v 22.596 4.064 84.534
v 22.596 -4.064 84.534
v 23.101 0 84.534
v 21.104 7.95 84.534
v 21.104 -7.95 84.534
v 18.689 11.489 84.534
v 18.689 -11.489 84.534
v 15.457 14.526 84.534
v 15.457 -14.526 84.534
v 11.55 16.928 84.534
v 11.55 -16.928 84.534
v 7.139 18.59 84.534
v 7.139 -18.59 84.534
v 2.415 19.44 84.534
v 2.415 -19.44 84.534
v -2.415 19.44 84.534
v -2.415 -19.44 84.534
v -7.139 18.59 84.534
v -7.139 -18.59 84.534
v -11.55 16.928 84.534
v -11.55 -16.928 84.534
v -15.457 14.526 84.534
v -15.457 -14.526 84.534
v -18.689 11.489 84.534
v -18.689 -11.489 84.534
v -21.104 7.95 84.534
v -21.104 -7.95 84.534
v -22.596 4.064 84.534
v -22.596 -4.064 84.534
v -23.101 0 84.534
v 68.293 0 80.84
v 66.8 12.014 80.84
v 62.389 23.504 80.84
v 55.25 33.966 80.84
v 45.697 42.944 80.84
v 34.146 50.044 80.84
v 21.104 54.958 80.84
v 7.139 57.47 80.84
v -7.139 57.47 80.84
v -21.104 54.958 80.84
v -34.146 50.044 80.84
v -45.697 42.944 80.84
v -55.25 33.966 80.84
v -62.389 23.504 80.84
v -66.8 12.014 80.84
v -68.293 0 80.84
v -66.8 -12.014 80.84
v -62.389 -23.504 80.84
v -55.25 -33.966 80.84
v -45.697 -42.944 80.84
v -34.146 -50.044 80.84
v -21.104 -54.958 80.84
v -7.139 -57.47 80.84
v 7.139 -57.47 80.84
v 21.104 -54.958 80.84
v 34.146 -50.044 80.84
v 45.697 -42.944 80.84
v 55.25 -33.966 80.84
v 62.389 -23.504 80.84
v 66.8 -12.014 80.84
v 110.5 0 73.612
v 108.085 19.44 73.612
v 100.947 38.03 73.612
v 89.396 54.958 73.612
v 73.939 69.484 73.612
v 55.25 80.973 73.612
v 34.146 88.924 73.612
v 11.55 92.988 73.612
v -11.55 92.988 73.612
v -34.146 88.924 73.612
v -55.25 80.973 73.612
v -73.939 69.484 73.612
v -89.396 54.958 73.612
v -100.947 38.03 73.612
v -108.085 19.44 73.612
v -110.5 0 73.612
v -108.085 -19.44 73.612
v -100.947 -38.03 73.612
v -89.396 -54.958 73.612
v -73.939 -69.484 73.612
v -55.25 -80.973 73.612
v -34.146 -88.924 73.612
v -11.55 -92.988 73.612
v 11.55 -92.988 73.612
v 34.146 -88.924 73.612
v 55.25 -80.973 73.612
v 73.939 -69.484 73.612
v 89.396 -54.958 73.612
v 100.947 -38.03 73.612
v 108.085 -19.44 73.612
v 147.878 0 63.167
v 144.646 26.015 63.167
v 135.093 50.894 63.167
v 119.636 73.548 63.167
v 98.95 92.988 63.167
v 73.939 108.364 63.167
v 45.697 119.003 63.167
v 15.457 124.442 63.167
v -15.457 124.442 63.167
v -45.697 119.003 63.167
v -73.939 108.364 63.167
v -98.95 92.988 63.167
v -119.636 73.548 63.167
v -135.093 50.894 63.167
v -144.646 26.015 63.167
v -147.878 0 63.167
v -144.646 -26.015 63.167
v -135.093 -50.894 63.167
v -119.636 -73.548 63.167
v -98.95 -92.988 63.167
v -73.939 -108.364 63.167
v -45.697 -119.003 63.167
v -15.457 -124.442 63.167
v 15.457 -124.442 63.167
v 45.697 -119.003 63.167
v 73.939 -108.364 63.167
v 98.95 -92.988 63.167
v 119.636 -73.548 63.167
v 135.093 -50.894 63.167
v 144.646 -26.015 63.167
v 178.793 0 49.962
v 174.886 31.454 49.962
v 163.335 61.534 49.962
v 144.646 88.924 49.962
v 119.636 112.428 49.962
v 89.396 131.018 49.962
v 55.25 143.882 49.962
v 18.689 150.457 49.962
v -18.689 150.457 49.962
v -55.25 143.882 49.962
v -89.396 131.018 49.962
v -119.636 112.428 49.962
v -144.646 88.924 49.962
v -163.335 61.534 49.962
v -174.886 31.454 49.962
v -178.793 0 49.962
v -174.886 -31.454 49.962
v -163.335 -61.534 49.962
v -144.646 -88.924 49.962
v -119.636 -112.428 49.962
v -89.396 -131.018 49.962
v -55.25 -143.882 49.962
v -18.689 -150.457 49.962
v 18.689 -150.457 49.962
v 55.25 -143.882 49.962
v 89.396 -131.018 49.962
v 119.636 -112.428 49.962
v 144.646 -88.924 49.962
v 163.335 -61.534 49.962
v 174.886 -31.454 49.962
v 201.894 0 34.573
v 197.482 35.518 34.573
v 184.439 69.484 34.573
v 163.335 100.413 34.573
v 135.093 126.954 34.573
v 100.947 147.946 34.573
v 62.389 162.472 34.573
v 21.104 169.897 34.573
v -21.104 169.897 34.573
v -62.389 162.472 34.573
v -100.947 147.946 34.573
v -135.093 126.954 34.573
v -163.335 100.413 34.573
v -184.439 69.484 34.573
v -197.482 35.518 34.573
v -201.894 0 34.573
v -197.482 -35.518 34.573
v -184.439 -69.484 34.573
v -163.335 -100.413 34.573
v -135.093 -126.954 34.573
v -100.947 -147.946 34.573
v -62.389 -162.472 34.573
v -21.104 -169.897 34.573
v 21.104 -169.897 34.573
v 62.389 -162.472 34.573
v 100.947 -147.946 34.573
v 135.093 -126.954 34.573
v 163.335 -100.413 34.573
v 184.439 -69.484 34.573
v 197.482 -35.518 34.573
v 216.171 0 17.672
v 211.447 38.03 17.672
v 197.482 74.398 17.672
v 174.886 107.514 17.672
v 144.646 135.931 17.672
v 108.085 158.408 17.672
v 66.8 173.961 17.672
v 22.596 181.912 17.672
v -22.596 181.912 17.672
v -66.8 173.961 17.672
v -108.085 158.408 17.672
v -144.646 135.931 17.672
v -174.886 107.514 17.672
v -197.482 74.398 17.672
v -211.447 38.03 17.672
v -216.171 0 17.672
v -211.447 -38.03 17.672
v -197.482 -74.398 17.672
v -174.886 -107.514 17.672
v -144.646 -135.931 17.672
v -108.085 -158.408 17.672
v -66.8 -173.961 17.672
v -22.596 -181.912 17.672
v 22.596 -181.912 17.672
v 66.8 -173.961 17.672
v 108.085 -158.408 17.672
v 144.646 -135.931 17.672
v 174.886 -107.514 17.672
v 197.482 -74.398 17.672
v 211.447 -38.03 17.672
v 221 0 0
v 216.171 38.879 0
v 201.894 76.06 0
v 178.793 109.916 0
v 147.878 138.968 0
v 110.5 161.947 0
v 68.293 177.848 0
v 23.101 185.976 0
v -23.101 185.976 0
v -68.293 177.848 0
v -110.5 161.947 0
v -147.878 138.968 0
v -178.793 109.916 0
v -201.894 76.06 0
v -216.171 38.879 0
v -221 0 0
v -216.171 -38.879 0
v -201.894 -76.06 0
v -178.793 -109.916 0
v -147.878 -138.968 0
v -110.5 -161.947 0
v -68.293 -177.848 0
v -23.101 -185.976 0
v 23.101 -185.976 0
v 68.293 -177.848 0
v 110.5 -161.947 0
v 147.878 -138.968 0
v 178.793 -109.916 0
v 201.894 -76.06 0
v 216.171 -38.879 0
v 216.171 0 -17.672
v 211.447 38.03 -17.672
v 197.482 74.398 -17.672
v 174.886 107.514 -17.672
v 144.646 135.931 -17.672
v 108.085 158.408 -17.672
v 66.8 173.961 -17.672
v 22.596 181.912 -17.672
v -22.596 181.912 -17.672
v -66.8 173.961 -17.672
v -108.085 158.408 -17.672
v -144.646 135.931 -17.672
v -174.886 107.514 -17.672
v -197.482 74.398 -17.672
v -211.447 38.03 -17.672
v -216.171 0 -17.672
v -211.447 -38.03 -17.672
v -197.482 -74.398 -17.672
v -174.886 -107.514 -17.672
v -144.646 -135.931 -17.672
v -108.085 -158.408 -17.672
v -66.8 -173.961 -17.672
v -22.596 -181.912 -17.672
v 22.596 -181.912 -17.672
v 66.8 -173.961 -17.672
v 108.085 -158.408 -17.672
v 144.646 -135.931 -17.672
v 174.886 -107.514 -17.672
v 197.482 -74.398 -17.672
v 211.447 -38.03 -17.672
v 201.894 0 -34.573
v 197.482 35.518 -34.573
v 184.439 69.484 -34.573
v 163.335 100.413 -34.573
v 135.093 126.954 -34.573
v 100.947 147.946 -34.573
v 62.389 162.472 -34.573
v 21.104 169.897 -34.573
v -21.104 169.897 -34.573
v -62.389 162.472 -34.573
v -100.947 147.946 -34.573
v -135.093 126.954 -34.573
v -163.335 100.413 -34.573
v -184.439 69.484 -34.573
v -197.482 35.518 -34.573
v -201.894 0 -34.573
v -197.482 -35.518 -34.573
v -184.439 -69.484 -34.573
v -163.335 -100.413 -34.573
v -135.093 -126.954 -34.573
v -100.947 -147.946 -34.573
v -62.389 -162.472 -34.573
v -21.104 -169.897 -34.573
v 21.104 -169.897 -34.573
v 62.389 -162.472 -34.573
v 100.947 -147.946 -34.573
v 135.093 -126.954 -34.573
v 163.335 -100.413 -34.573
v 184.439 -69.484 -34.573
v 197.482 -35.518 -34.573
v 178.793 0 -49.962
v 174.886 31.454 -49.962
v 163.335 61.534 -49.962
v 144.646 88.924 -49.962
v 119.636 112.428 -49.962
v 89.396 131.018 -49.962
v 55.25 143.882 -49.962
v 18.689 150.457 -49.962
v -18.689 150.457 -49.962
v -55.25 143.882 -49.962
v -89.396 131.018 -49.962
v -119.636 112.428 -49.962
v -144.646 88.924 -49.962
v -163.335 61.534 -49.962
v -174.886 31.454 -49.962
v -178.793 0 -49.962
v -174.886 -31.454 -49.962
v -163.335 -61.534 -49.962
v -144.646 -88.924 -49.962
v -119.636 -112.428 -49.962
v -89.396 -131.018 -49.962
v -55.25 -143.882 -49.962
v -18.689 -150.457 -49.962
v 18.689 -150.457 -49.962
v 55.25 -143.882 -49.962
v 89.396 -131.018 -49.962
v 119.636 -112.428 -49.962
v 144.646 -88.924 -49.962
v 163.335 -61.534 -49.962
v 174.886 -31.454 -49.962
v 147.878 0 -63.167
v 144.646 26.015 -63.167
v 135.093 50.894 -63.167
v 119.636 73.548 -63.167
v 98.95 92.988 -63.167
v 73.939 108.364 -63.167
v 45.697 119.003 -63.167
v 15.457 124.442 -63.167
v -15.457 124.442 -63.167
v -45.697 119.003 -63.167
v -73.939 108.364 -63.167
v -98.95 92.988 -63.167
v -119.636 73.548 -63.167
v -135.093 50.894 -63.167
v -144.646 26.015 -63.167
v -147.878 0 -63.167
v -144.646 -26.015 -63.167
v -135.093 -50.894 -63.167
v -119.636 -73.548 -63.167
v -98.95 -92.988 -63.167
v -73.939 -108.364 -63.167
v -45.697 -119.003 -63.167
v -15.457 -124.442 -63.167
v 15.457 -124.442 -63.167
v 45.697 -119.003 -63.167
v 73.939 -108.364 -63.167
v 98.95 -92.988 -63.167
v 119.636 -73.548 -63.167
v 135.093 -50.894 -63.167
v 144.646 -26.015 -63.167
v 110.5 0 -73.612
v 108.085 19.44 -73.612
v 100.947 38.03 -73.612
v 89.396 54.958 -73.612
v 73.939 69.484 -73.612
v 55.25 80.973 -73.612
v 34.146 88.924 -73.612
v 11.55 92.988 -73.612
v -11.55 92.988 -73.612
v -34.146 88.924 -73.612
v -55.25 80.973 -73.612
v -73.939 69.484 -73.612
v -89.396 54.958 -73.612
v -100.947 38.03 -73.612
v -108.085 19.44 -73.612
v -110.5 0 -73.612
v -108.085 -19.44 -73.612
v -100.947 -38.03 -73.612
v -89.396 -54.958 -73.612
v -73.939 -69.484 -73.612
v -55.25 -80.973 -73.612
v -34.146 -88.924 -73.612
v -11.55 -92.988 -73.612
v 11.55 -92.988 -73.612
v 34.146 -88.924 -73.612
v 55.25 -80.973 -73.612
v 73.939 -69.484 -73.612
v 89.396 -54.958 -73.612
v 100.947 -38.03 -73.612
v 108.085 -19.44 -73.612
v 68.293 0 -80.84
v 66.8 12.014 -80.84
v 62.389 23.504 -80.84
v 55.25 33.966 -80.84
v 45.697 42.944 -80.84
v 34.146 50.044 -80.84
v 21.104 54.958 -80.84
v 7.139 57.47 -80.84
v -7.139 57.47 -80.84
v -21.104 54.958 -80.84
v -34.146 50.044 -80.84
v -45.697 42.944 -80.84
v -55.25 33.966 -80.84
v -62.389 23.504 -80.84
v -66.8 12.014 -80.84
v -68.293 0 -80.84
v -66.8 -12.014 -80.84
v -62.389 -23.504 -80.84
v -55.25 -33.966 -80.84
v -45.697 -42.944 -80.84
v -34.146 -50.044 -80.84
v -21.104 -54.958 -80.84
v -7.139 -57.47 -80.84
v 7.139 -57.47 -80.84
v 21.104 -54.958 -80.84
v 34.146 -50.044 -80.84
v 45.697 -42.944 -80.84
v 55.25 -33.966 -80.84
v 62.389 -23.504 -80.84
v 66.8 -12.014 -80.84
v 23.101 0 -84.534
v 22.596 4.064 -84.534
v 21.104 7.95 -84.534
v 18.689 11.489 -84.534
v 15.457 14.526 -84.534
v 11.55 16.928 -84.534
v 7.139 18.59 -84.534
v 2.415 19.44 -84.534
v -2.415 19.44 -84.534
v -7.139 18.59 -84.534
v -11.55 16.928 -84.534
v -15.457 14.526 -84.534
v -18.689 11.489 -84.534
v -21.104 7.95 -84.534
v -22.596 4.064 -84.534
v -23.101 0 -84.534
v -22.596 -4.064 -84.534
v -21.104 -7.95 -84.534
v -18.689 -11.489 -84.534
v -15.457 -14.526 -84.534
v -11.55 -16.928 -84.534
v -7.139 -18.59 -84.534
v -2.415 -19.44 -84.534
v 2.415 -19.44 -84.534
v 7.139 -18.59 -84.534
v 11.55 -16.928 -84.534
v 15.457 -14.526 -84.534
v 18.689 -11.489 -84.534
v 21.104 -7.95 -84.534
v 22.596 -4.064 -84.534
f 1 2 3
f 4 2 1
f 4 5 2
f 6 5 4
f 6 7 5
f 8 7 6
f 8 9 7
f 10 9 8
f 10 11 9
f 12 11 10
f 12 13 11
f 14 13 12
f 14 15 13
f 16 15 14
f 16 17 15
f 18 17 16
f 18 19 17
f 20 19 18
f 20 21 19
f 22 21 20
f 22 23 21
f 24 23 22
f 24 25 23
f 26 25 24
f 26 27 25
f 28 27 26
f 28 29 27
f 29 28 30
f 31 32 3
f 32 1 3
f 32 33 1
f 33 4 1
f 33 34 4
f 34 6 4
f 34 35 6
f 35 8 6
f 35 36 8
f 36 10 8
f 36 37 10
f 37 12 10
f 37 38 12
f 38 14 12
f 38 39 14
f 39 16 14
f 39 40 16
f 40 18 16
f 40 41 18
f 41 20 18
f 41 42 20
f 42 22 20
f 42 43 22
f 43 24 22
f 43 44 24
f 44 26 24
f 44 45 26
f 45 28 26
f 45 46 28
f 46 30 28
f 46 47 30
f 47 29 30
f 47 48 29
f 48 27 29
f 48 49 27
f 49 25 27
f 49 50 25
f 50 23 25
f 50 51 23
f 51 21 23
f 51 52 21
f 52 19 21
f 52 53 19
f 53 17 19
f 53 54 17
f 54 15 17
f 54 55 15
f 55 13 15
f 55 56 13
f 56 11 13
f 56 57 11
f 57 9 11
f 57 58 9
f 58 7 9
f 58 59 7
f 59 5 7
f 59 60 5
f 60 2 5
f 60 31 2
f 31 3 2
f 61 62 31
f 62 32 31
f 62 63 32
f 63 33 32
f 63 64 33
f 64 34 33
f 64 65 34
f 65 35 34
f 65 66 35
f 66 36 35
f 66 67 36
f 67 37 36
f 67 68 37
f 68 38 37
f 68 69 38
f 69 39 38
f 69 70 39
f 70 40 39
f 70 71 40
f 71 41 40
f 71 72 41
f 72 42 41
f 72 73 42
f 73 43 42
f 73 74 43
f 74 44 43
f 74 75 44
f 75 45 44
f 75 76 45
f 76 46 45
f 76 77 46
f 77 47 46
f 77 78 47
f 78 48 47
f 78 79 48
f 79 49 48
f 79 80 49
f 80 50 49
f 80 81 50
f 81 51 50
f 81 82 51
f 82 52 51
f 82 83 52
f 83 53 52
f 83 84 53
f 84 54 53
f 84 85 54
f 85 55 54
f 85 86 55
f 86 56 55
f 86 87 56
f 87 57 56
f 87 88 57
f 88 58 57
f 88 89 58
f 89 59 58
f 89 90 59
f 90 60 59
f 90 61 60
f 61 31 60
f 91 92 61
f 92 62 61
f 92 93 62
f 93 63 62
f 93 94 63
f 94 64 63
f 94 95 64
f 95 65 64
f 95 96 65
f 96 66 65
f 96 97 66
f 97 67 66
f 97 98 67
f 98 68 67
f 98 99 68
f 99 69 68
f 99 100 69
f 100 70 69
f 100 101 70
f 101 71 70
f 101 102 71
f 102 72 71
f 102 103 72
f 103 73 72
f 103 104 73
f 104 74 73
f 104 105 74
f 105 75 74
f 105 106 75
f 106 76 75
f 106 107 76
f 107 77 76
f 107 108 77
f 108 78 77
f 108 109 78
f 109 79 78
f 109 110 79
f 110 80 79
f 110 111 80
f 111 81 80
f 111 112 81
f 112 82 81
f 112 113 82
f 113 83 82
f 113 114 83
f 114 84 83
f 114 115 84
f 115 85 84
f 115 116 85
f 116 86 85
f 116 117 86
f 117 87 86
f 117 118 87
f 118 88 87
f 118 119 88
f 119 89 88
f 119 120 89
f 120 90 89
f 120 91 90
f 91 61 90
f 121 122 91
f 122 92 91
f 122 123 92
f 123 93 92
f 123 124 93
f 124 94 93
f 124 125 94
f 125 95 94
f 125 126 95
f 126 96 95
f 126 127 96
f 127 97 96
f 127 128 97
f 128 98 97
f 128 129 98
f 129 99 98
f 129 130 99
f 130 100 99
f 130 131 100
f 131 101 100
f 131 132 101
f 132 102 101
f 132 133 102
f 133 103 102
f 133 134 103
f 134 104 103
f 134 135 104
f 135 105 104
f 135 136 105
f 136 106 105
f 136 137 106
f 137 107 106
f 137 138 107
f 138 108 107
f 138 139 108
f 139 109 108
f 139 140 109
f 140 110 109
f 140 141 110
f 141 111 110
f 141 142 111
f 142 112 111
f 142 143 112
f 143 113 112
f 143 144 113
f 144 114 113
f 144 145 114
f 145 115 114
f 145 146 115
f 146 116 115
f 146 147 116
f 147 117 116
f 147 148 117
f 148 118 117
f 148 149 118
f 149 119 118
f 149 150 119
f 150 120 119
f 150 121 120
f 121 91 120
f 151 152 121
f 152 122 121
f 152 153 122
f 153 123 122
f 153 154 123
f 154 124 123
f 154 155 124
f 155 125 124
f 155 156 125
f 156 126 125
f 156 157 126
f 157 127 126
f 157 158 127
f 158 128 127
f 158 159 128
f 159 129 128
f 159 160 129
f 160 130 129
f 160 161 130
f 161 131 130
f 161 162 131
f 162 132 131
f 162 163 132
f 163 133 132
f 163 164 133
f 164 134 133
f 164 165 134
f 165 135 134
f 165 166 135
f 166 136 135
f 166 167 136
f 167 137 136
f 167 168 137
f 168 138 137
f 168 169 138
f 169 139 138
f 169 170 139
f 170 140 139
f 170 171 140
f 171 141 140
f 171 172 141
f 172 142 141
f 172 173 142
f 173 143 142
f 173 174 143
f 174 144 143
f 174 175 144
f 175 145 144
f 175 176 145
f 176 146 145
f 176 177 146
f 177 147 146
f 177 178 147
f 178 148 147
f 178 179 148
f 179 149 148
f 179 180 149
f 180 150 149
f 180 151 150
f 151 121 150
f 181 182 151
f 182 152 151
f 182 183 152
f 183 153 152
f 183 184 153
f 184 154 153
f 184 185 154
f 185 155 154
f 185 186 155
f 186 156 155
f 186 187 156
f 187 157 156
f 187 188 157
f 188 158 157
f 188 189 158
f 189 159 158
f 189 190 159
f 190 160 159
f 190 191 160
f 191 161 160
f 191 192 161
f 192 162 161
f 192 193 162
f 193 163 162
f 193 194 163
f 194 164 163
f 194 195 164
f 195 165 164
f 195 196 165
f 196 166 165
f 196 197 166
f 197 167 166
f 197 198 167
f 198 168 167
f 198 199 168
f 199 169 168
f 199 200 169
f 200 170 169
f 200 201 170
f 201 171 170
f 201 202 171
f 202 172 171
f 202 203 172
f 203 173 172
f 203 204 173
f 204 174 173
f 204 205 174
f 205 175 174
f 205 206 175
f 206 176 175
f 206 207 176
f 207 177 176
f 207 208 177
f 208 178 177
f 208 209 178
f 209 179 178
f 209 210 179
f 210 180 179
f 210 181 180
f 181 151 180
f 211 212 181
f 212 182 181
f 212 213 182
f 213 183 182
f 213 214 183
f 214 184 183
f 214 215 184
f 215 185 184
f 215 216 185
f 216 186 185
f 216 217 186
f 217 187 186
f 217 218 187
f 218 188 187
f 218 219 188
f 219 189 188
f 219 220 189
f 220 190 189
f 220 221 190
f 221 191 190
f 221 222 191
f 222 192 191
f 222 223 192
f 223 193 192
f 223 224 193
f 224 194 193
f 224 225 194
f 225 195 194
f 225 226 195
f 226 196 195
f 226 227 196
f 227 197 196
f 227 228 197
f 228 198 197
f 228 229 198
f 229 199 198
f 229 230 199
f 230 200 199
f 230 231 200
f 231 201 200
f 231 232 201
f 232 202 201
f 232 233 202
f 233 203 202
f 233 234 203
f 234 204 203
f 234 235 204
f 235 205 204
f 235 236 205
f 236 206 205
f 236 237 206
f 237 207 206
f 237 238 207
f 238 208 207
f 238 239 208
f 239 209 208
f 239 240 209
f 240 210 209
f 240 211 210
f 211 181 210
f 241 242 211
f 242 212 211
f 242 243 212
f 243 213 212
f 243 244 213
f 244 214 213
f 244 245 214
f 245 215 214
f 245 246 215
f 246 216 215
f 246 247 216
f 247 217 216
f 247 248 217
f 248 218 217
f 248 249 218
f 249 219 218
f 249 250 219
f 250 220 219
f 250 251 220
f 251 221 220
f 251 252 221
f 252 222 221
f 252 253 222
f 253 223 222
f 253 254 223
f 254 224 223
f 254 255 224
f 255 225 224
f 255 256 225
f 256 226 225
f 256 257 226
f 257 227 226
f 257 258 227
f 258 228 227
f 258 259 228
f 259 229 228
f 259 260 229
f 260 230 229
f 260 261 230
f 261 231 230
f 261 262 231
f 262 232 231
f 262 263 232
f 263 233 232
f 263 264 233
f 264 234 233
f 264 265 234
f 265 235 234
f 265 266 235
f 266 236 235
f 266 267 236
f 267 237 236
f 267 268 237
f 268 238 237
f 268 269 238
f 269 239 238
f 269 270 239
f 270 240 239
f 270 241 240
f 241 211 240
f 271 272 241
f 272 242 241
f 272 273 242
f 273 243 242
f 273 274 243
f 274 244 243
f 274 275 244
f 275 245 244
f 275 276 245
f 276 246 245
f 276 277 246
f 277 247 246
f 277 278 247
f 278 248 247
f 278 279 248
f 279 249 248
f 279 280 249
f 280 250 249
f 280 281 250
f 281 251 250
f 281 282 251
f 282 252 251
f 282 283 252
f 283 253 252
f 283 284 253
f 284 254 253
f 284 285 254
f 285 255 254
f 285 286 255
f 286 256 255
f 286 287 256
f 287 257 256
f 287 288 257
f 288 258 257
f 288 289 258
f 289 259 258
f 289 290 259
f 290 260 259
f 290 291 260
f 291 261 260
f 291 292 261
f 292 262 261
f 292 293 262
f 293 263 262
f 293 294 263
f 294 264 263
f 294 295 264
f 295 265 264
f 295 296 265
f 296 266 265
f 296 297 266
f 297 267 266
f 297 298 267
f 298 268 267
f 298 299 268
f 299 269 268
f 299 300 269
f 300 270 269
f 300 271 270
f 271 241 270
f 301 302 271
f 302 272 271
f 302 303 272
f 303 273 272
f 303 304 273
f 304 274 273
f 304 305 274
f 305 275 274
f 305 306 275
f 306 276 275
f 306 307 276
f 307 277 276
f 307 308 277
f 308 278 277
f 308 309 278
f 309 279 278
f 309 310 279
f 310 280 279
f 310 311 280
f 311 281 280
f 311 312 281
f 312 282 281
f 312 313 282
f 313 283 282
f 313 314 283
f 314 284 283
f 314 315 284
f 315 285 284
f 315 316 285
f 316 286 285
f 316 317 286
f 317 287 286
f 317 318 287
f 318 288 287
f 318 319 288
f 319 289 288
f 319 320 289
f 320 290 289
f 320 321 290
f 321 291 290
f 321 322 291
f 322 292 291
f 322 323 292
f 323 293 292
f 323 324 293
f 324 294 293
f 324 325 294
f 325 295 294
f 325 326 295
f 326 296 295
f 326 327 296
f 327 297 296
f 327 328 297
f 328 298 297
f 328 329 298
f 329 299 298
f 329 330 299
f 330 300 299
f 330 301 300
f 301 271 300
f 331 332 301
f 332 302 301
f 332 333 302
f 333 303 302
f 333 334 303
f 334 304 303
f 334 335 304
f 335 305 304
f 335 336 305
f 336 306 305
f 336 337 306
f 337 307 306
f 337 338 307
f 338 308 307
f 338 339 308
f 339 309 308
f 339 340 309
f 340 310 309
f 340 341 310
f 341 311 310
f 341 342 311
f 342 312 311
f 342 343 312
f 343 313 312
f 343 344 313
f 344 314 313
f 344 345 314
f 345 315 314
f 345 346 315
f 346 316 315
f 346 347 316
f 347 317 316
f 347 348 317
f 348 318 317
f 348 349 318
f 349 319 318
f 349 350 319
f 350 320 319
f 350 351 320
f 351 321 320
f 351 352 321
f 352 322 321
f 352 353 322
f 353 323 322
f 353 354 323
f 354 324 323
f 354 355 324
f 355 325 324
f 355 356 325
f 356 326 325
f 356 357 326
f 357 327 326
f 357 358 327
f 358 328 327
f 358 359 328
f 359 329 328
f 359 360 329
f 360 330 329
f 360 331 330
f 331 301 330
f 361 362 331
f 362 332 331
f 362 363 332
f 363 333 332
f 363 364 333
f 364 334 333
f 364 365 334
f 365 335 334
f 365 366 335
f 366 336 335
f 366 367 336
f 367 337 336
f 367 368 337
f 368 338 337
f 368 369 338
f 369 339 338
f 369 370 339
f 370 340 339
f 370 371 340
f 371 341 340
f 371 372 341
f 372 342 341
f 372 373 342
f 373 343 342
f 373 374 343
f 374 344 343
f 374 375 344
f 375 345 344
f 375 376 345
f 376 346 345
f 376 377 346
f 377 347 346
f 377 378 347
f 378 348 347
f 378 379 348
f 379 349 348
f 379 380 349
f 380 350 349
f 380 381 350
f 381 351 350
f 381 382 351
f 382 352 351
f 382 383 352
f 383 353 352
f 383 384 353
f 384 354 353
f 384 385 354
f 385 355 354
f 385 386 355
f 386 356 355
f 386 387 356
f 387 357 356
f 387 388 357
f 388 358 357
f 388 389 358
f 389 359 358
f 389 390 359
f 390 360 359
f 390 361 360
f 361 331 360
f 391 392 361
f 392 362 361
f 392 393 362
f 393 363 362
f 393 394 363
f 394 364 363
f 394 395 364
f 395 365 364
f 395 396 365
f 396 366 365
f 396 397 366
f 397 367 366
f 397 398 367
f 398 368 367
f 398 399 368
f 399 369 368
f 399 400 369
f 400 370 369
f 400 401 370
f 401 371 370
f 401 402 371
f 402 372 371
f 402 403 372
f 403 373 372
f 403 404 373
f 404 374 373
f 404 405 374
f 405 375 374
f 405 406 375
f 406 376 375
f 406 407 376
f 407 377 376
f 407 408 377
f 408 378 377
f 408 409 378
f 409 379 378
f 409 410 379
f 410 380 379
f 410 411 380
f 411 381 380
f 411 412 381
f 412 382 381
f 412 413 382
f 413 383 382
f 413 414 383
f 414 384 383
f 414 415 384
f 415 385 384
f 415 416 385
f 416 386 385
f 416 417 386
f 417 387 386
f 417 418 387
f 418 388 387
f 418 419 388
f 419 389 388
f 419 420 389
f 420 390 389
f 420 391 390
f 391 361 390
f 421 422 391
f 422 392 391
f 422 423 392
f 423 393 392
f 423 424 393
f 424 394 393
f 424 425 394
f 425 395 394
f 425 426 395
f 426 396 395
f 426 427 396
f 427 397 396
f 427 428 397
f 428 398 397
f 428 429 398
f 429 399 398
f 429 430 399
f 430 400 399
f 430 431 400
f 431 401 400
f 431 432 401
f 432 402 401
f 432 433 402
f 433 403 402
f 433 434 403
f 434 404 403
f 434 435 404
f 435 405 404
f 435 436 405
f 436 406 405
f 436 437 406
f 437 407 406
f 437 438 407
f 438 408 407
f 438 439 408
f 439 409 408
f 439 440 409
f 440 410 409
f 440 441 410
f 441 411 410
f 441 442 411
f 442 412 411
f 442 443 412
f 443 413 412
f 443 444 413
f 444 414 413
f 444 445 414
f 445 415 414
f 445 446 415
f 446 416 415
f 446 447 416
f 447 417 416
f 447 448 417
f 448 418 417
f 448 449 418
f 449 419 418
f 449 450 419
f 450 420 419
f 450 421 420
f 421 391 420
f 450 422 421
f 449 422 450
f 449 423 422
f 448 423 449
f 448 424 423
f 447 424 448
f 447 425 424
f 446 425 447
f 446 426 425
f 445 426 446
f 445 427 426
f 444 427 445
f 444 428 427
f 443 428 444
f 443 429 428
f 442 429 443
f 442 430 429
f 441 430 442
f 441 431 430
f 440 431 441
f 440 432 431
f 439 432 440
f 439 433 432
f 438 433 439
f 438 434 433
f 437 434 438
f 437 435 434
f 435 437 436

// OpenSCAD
// Generated by SolidPython 1.0.1 on 2020-07-29 00:46:50


scale(v = [13, 11, 5]) {
	sphere(r = 17);
}
/***********************************************
*********      SolidPython code:      **********
************************************************
 
# import packages: SolidPython
from solid import *
from solid.utils import *
from itertools import chain, combinations, permutations


class Resize:

    def __init__(self, scad_file):
        self.scad_file = scad_file
        #self.scad_file = import_scad(scad_file)
        # cone/cylinder param:
        self.r1 = 0
        self.r2 = 0
        self.h = 0
        # rectangular prism param:
        self.w = 0
        self.l = 0
        # ellipse param:
        self.r = 0

    # import OpenScad code (file name corresponds to shape)


    # classify shape + parameters
    def assign(self, param1, param2, param3):
        if self.scad_file == 'cone.scad':
            self.r1 = param1
            self.r2 = param2
            self.h = param3
        elif self.scad_file == 'cylinder.scad':
            self.r1 = param1
            self.r2 = param2
            self.h = param3
        elif self.scad_file == 'rectangularPrism.scad':
            self.h = param1
            self.l = param2
            self.w = param3
        else:
            self.r = param1
            self.h = param2

    # resize parameters
    def iterate(self):
        x = range(3, 20, 2)
        i = 1
        if self.scad_file == 'cone.scad':
            tempList = list(permutations(x, 2))
            for temp in tempList:
                param1 = temp[0]
                param2 = temp[1]
                filepath = 'produced_scad_files/' + 'cone' + str(param1) + '_' + str(param2) + '_' + '.scad'
                scad_render_to_file(cylinder(h=param1, r1=param2, r2=0), filepath)

        elif self.scad_file == 'cylinder.scad':
            tempList = list(permutations(x, 3))
            for temp in tempList:
                param1 = temp[0]
                param2 = temp[1]
                filepath = 'produced_scad_files/' + 'cylinder' + str(param1) + '_' + str(param2) + '_' + '.scad'
                scad_render_to_file(cylinder(h=param1, r1=param2, r2=param2), filepath)

        elif self.scad_file == 'rectangularPrism.scad':
            tempList = list(permutations(x, 3))
            for temp in tempList:
                param1 = temp[0]
                param2 = temp[1]
                param3 = temp[2]
                filepath = 'produced_scad_files/' + 'rectangularPrism' + str(param1) + '_' + str(param2) + '_' + str(
                    param3) + '.scad'
                scad_render_to_file(cube(size=(param1, param2, param3)), filepath)

        elif self.scad_file == 'ellipse.scad':
            tempList = list(permutations(x, 4))
            for temp in tempList:
                param1 = temp[0]
                param2 = temp[1]
                param3 = temp[2]
                param4 = temp[3]
                filepath = 'produced_scad_files/' + 'ellipse' + str(param1) + '_' + str(param2) + '_' + str(param3) + '_' + str(param4) + '.scad'
                scad_render_to_file(scale([param1, param2, param3])(sphere(r=param4)), filepath)

    def render_to_scadfile(self):
        scad_render_to_file(scad, 'example.scad') 
 
************************************************/
